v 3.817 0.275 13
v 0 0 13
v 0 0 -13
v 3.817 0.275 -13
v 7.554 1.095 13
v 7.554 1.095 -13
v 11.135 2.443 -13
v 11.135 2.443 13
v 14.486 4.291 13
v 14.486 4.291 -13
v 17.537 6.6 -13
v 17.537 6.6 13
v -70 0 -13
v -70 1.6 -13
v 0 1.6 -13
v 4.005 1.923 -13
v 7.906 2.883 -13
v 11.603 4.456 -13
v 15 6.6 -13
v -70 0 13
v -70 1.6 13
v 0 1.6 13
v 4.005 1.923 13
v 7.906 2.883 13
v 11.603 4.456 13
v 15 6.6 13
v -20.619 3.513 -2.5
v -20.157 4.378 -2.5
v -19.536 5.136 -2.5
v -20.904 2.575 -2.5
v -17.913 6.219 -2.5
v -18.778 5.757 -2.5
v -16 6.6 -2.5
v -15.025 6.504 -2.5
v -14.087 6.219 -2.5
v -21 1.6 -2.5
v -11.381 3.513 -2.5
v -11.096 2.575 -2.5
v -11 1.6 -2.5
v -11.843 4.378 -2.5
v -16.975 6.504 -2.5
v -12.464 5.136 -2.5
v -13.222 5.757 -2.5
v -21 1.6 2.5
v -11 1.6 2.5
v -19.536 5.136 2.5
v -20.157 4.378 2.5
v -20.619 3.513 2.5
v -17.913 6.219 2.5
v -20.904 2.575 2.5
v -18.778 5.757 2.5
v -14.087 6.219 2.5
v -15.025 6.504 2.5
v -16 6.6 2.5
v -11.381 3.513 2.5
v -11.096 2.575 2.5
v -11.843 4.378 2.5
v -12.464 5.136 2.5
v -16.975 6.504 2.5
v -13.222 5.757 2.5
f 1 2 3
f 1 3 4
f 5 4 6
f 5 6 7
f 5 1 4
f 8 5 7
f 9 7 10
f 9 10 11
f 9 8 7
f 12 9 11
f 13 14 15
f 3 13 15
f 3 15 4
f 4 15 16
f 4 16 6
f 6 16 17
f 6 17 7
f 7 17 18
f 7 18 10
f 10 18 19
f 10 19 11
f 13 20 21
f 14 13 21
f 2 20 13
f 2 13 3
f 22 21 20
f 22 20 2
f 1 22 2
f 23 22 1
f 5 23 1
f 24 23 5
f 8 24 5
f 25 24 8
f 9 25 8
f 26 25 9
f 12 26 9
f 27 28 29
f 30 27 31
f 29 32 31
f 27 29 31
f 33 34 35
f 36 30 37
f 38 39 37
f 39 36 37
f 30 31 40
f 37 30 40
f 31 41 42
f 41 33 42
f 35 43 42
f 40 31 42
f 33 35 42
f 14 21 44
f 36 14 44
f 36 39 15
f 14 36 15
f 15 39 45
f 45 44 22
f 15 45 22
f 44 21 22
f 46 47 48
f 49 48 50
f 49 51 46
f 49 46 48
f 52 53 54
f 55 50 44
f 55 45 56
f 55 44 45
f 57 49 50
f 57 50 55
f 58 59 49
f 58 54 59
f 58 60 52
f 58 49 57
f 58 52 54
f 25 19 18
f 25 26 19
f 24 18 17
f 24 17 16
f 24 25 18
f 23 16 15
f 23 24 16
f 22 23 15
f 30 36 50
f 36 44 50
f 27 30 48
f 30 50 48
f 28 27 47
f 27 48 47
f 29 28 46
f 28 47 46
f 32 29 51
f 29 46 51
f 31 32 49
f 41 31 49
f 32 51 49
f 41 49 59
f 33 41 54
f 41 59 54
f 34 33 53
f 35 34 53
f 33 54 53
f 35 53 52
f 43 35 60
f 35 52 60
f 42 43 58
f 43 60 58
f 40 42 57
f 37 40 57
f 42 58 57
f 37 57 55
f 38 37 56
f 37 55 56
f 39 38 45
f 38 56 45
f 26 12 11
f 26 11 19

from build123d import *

# Parameters (mm, degrees)
F0_W          = 70
F0_H          = 1.6
F1_DEPTH      = 13
F1_DEPTH_BACK = 13
F2_W          = 5
F2_H          = 5
F3_ANGLE      = 180


with BuildPart() as f1:
    # F0 (on Top) → F1 (new body, two sides)
    with BuildSketch(Plane.XY) as f1_sk:
        with Locations((-35, 0.8)):
            Rectangle(F0_W, F0_H)
        with BuildLine():
            Line((0, 1.6), (0, 0))
            ThreePointArc((0, 0), (9.369098, 1.704619), (17.537389, 6.6))
            Line((17.537389, 6.6), (15, 6.6))
            ThreePointArc((15, 6.6), (7.905694, 2.882918), (0, 1.6))
        make_face()
    extrude(amount=F1_DEPTH)
    extrude(f1_sk.sketch, amount=-F1_DEPTH_BACK)

    # F2 (on face) → F3 (revolve)
    with BuildSketch(Plane(origin=(0, 1.6, 0), x_dir=(-1, 0, 0), z_dir=(0, 1, 0))):
        with Locations((18.5, 0)):
            Rectangle(F2_W, F2_H)
    revolve(axis=Axis((-16, 1.6, 0), (0, 0, -1)), revolution_arc=F3_ANGLE)


solid = f1.part
